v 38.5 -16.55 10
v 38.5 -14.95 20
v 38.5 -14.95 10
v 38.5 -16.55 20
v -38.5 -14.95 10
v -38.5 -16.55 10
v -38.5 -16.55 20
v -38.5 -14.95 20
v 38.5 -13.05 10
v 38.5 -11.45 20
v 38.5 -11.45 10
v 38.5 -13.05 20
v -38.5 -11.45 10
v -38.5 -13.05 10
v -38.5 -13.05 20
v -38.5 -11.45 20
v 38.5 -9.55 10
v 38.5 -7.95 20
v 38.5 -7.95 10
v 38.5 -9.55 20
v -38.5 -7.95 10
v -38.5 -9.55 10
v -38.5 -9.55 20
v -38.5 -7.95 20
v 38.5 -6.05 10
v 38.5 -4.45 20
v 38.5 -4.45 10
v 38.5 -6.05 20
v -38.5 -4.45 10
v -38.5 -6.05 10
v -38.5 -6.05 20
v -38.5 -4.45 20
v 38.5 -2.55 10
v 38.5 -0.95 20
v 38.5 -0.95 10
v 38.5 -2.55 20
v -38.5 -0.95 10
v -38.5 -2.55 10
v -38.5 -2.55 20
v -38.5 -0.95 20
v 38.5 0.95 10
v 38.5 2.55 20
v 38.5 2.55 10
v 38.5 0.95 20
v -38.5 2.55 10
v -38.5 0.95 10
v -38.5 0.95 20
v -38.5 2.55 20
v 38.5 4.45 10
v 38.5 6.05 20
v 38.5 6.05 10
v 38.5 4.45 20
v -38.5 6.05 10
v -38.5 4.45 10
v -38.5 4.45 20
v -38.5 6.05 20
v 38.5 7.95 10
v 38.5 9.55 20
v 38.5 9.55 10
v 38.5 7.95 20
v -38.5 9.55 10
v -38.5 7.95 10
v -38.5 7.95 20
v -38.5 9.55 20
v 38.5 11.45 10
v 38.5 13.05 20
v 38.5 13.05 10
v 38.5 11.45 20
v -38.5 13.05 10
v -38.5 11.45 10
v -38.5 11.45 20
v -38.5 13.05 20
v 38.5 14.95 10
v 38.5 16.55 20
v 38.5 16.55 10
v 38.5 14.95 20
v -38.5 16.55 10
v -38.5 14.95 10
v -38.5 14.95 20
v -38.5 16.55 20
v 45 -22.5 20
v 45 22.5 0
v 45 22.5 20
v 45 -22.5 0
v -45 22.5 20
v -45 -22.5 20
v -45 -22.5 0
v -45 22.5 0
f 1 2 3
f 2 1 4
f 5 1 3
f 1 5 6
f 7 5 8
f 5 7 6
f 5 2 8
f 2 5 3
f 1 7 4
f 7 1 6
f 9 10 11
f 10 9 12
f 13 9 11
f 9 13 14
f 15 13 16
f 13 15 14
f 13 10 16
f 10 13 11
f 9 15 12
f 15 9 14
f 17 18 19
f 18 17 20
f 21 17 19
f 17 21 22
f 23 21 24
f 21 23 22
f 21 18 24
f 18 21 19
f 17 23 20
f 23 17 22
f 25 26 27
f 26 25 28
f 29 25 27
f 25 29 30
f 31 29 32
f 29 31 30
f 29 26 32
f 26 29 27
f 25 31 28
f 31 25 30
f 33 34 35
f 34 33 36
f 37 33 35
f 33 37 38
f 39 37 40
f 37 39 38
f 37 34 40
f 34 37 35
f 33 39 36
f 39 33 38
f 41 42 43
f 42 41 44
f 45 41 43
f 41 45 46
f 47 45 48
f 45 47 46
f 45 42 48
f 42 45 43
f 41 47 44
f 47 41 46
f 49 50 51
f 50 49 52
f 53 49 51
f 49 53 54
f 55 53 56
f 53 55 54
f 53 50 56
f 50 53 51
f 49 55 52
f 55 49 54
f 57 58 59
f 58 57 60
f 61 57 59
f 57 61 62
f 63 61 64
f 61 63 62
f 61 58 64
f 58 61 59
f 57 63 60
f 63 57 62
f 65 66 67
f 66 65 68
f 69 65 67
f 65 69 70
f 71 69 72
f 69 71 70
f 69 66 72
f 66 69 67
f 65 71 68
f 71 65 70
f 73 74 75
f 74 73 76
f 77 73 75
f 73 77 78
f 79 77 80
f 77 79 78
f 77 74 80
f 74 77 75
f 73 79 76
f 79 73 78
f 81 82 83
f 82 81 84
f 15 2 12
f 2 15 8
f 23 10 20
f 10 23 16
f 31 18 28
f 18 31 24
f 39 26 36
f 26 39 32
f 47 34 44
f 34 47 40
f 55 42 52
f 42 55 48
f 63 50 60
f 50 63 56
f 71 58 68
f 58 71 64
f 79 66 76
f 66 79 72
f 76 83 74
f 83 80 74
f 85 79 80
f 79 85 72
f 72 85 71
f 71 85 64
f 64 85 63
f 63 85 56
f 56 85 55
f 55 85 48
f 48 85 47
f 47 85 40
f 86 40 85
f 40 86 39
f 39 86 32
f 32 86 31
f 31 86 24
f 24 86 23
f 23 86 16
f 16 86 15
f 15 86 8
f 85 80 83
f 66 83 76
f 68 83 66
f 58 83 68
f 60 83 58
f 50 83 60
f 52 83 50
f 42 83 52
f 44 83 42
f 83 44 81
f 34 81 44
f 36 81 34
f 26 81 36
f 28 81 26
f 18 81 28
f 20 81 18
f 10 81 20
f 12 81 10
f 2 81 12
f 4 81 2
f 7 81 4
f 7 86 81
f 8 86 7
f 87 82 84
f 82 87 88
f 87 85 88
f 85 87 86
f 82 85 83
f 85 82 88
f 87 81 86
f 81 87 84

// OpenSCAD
// Microscope slide drying rack - 10 slides standing on long edge
// Print orientation: base on XY plane, slots open upward (+Z)

$fn = 64;

// --- Base block ---
base_len   = 90;    // block length along X
base_wid   = 45;    // block width along Y
base_ht    = 20;    // block height along Z

// --- Slots ---
slot_count = 10;    // number of slides held
slot_len   = 77;    // slot length along X
slot_wid   = 1.6;   // slot width along Y
slot_depth = 10;    // slot depth from top face
slot_pitch = 3.5;   // centre-to-centre spacing along Y

// --- Misc ---
eps        = 0.5;   // overshoot so cutters pass through top face

// Y offset of first slot centre so the group is centred on the block
slot_y0 = -(slot_count - 1) * slot_pitch / 2;

difference() {
    // Solid base block, centred in X/Y, sitting on z = 0
    translate([-base_len / 2, -base_wid / 2, 0])
        cube([base_len, base_wid, base_ht]);

    // Parallel slots cut into the top face
    for (i = [0 : slot_count - 1]) {
        translate([-slot_len / 2,
                   slot_y0 + i * slot_pitch - slot_wid / 2,
                   base_ht - slot_depth])
            cube([slot_len, slot_wid, slot_depth + eps]);
    }
}
